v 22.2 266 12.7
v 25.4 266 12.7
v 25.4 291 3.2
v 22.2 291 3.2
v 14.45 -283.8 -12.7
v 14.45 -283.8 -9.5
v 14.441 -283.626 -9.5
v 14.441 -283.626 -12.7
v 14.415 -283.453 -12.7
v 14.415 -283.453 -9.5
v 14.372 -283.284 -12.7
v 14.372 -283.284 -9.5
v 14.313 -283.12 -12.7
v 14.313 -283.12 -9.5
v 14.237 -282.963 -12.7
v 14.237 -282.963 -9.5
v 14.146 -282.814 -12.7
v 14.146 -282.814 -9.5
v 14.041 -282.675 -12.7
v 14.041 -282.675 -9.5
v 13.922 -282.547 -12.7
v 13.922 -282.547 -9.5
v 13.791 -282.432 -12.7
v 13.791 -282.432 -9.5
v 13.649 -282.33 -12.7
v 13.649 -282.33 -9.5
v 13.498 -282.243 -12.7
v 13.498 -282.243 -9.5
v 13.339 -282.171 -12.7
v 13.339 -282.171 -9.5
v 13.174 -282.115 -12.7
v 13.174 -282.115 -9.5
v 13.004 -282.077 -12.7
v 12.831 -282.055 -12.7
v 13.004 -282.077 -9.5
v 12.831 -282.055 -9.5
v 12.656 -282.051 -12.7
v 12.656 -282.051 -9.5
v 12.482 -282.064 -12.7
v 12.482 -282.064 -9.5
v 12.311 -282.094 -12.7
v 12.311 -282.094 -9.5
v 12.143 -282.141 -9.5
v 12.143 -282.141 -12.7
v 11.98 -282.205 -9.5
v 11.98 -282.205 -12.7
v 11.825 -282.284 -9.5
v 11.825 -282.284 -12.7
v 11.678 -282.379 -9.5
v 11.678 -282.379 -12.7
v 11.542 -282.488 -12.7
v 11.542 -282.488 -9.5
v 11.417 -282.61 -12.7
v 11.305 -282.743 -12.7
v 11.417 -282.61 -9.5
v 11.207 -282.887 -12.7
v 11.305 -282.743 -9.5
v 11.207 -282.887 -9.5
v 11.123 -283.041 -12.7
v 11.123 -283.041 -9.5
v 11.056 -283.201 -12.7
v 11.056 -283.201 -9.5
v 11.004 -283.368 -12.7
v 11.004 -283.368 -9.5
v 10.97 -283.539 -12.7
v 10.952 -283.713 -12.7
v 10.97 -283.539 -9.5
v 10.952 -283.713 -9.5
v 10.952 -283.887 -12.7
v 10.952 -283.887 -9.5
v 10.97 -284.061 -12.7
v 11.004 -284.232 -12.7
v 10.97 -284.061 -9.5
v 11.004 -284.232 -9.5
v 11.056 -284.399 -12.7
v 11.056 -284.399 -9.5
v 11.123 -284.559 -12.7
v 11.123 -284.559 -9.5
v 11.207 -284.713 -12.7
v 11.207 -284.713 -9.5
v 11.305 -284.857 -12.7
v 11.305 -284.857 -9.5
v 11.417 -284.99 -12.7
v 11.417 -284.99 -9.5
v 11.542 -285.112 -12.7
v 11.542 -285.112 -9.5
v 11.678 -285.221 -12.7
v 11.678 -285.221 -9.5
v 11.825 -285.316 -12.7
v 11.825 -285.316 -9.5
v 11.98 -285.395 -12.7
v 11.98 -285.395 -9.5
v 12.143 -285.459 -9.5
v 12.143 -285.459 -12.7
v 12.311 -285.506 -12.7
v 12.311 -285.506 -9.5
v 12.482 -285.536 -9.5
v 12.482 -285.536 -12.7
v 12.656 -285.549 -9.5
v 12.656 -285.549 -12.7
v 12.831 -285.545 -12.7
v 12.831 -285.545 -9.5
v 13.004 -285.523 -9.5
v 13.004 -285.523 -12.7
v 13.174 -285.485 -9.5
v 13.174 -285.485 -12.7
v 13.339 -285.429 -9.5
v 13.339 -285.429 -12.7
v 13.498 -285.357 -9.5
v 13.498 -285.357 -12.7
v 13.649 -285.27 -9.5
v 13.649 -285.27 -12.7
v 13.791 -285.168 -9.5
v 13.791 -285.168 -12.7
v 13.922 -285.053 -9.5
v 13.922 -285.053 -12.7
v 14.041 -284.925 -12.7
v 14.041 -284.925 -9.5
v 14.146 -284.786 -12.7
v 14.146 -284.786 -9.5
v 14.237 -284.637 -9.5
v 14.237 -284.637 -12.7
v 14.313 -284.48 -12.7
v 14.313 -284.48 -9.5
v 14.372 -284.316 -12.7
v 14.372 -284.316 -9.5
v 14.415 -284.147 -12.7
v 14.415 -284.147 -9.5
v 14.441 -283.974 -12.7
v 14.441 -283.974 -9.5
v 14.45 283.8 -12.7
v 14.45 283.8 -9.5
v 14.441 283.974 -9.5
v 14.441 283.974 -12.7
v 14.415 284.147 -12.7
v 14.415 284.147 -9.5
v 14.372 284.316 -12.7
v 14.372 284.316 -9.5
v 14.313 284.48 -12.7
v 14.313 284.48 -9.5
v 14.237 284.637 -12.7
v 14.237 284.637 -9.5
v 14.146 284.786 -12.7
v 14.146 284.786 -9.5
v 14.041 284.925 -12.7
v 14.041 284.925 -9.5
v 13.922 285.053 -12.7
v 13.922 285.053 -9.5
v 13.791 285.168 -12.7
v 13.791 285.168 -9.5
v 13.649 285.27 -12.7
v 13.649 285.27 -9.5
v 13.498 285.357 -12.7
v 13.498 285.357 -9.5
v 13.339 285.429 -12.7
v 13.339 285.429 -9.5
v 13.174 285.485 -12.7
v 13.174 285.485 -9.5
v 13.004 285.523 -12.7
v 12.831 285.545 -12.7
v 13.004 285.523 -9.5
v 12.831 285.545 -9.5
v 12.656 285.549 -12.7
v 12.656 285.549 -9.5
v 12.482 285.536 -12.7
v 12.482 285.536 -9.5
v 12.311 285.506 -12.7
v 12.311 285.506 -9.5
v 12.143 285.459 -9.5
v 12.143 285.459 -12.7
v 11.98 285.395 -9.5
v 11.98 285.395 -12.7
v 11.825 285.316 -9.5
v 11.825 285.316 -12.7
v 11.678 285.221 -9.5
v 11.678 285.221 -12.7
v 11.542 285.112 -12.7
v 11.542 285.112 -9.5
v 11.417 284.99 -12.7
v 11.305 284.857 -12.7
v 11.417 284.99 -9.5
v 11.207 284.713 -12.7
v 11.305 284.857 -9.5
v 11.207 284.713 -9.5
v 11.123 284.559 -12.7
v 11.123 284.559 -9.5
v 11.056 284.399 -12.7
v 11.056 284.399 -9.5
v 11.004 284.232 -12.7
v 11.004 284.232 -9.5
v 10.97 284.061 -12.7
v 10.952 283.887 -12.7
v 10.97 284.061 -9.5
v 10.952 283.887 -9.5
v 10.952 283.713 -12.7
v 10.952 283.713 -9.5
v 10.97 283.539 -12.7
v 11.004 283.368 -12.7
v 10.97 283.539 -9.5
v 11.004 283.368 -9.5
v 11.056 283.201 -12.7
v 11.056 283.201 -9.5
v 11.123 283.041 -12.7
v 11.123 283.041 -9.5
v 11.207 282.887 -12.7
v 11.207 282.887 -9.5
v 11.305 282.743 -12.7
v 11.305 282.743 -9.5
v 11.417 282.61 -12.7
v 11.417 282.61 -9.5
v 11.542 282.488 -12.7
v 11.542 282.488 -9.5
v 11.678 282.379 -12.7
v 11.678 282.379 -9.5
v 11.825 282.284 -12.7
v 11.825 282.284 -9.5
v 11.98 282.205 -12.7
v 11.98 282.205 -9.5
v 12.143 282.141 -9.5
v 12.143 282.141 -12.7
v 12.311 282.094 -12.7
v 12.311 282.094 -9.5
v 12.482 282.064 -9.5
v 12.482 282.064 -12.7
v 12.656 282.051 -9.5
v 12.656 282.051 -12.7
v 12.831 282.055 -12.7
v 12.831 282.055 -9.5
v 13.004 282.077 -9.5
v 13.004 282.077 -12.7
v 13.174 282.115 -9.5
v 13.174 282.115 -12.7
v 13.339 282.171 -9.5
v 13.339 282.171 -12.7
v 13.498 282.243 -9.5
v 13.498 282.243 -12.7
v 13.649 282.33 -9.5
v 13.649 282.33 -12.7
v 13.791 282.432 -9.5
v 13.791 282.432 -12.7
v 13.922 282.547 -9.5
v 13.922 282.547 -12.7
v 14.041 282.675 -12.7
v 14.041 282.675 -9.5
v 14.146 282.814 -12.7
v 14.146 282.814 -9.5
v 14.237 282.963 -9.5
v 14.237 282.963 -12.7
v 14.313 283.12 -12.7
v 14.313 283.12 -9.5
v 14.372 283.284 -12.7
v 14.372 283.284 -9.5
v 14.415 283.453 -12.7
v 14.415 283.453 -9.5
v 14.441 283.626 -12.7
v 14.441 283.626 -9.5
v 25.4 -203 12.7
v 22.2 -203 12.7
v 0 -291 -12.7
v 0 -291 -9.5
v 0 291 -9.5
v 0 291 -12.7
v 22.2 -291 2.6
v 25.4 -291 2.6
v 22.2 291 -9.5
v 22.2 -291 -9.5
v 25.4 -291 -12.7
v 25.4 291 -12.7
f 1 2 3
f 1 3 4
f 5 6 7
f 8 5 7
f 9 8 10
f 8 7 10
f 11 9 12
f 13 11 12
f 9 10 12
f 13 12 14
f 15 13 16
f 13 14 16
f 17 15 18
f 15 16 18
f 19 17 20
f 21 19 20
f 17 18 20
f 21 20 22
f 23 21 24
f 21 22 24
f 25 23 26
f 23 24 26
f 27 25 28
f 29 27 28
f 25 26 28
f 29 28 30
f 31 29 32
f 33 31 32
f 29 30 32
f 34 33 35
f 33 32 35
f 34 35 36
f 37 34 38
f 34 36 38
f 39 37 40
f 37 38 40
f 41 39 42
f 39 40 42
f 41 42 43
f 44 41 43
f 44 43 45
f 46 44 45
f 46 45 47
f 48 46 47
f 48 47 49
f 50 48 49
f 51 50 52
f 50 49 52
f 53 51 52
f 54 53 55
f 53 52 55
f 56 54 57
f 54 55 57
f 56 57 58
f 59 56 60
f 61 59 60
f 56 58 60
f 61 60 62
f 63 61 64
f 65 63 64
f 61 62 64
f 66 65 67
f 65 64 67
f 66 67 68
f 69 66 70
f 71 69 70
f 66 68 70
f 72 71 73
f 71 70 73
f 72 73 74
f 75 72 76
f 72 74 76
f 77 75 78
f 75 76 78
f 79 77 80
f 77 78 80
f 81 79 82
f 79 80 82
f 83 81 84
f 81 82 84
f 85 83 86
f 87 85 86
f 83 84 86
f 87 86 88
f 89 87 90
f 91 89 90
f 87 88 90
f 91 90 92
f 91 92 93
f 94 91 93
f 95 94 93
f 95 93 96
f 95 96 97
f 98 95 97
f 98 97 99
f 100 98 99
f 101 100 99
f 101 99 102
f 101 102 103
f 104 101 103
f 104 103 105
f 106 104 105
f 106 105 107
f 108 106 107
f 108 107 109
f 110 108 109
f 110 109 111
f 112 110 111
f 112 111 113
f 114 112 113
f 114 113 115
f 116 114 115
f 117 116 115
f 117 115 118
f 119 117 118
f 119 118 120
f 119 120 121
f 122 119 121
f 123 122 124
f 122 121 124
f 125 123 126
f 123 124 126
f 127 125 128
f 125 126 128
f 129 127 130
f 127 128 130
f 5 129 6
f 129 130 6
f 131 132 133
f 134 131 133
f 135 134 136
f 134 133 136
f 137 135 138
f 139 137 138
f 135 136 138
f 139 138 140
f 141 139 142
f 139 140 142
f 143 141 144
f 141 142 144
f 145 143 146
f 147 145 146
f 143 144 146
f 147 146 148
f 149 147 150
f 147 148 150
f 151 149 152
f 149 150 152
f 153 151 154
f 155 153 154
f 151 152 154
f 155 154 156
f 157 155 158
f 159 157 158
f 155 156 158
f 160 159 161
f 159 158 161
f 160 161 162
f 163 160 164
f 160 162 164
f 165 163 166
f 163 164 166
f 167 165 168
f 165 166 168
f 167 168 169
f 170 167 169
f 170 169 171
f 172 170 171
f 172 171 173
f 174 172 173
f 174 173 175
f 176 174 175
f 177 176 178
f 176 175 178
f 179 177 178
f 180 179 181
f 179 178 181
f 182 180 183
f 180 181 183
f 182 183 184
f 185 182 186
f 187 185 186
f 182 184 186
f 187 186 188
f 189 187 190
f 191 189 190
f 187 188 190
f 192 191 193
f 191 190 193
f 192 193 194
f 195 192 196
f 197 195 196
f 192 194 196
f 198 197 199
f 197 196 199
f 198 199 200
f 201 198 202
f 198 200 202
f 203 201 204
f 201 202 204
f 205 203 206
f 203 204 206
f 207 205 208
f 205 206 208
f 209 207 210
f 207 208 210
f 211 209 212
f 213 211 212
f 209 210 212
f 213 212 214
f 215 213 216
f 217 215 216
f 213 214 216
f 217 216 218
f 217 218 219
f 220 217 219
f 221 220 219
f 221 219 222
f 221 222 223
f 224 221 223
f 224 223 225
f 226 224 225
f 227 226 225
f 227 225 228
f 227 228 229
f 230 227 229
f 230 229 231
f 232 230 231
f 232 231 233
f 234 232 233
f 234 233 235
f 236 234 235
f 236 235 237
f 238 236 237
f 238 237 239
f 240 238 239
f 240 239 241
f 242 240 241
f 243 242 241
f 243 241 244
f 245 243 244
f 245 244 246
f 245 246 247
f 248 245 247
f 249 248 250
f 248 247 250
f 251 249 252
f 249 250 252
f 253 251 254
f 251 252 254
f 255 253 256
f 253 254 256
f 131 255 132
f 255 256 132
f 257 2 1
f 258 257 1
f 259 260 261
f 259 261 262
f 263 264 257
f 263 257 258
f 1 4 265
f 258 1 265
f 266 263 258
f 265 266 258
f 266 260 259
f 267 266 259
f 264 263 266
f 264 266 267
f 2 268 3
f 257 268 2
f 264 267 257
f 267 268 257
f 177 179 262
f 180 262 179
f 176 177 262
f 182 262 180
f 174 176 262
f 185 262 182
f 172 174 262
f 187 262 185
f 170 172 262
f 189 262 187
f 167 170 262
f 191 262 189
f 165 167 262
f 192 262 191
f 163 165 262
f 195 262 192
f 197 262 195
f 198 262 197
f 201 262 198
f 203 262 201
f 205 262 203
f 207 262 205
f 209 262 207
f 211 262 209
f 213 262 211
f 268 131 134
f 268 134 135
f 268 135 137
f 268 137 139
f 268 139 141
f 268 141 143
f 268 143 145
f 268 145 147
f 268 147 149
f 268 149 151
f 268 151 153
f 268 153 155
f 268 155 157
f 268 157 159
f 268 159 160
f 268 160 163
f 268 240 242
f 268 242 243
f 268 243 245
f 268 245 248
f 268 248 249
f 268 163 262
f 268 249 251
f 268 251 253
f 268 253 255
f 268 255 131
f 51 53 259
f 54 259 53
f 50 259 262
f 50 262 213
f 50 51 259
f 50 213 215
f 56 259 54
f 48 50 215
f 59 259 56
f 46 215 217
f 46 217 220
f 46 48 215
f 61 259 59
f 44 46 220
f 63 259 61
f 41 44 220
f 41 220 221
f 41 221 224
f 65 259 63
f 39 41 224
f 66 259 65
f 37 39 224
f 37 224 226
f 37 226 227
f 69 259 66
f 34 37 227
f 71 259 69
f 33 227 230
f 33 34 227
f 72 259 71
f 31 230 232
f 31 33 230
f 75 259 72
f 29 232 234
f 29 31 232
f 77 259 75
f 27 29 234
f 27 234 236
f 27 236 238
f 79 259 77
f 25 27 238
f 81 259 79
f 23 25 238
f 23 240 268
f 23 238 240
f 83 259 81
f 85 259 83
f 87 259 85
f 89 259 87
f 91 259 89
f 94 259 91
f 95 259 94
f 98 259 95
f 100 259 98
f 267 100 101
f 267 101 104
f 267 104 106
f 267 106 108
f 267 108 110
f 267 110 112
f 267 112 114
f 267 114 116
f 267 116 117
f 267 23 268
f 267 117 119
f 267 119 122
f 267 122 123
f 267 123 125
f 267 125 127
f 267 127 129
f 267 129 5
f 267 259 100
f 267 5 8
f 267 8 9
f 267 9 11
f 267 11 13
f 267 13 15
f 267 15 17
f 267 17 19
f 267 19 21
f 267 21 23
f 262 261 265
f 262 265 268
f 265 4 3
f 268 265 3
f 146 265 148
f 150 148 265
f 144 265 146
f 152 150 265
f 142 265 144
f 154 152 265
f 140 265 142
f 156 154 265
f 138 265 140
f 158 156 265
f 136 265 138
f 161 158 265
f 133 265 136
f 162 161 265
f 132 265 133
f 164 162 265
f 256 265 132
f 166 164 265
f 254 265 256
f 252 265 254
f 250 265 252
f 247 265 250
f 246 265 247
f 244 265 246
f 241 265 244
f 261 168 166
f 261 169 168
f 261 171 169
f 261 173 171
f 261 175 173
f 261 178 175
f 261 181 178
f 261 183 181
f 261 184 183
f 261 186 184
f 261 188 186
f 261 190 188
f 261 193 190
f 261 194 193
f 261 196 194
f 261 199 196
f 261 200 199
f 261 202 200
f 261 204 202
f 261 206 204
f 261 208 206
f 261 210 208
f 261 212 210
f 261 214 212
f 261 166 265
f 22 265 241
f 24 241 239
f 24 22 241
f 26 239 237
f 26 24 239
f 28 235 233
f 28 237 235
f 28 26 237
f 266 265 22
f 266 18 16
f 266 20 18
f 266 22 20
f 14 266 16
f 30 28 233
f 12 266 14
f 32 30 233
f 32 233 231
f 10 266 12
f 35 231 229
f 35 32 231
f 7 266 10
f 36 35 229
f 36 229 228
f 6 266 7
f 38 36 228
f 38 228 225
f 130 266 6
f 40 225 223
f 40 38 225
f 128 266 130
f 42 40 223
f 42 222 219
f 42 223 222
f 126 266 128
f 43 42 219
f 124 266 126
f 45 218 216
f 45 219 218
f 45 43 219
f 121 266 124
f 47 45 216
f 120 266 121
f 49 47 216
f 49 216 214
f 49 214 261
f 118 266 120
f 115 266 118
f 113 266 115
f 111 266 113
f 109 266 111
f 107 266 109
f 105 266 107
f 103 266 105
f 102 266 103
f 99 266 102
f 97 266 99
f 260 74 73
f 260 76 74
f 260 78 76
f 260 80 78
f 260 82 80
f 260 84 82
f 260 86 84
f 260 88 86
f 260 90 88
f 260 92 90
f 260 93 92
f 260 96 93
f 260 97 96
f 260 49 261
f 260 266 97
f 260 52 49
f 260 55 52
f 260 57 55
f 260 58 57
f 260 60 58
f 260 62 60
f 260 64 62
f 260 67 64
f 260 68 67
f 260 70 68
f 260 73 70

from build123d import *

# Parameters (mm, degrees)
F1_DEPTH = 291
F3_SIZE2 = 25
F3_SIZE  = 9.5
F4_SIZE2 = 10.1
F4_SIZE  = 88
F6_R     = 1.75
F7_DEPTH = 3.2


with BuildPart() as f1:
    # F0 (on Front) → F1 (new body, symmetric)
    with BuildSketch(Plane.XZ):
        Polygon((25.4, 12.7), (22.2, 12.7), (22.2, -9.5), (0, -9.5), (0, -12.7), (25.4, -12.7), align=None)
    extrude(amount=F1_DEPTH, both=True)

    # F3
    f3_edges = [f1.edges().sort_by_distance(p)[0] for p in [
        (23.8, 291, 12.7),
    ]]
    f3_side = f1.faces().sort_by_distance((23.8, 291, 12.34079))[0]
    chamfer(f3_edges, length=F3_SIZE, length2=F3_SIZE2, reference=f3_side)

    # F4
    f4_edges = [f1.edges().sort_by_distance(p)[0] for p in [
        (23.8, -291, 12.7),
    ]]
    f4_side = f1.faces().sort_by_distance((23.8, -12.5, 12.7))[0]
    chamfer(f4_edges, length=F4_SIZE, length2=F4_SIZE2, reference=f4_side)

    # F6 (on face) → F7 (cut, through all)
    with BuildSketch(Plane.XY.offset(-9.5)):
        with Locations((12.7, -283.8)):
            Circle(F6_R)
        with Locations((12.7, 283.8)):
            Circle(F6_R)
    extrude(amount=-F7_DEPTH, mode=Mode.SUBTRACT)


solid = f1.part
